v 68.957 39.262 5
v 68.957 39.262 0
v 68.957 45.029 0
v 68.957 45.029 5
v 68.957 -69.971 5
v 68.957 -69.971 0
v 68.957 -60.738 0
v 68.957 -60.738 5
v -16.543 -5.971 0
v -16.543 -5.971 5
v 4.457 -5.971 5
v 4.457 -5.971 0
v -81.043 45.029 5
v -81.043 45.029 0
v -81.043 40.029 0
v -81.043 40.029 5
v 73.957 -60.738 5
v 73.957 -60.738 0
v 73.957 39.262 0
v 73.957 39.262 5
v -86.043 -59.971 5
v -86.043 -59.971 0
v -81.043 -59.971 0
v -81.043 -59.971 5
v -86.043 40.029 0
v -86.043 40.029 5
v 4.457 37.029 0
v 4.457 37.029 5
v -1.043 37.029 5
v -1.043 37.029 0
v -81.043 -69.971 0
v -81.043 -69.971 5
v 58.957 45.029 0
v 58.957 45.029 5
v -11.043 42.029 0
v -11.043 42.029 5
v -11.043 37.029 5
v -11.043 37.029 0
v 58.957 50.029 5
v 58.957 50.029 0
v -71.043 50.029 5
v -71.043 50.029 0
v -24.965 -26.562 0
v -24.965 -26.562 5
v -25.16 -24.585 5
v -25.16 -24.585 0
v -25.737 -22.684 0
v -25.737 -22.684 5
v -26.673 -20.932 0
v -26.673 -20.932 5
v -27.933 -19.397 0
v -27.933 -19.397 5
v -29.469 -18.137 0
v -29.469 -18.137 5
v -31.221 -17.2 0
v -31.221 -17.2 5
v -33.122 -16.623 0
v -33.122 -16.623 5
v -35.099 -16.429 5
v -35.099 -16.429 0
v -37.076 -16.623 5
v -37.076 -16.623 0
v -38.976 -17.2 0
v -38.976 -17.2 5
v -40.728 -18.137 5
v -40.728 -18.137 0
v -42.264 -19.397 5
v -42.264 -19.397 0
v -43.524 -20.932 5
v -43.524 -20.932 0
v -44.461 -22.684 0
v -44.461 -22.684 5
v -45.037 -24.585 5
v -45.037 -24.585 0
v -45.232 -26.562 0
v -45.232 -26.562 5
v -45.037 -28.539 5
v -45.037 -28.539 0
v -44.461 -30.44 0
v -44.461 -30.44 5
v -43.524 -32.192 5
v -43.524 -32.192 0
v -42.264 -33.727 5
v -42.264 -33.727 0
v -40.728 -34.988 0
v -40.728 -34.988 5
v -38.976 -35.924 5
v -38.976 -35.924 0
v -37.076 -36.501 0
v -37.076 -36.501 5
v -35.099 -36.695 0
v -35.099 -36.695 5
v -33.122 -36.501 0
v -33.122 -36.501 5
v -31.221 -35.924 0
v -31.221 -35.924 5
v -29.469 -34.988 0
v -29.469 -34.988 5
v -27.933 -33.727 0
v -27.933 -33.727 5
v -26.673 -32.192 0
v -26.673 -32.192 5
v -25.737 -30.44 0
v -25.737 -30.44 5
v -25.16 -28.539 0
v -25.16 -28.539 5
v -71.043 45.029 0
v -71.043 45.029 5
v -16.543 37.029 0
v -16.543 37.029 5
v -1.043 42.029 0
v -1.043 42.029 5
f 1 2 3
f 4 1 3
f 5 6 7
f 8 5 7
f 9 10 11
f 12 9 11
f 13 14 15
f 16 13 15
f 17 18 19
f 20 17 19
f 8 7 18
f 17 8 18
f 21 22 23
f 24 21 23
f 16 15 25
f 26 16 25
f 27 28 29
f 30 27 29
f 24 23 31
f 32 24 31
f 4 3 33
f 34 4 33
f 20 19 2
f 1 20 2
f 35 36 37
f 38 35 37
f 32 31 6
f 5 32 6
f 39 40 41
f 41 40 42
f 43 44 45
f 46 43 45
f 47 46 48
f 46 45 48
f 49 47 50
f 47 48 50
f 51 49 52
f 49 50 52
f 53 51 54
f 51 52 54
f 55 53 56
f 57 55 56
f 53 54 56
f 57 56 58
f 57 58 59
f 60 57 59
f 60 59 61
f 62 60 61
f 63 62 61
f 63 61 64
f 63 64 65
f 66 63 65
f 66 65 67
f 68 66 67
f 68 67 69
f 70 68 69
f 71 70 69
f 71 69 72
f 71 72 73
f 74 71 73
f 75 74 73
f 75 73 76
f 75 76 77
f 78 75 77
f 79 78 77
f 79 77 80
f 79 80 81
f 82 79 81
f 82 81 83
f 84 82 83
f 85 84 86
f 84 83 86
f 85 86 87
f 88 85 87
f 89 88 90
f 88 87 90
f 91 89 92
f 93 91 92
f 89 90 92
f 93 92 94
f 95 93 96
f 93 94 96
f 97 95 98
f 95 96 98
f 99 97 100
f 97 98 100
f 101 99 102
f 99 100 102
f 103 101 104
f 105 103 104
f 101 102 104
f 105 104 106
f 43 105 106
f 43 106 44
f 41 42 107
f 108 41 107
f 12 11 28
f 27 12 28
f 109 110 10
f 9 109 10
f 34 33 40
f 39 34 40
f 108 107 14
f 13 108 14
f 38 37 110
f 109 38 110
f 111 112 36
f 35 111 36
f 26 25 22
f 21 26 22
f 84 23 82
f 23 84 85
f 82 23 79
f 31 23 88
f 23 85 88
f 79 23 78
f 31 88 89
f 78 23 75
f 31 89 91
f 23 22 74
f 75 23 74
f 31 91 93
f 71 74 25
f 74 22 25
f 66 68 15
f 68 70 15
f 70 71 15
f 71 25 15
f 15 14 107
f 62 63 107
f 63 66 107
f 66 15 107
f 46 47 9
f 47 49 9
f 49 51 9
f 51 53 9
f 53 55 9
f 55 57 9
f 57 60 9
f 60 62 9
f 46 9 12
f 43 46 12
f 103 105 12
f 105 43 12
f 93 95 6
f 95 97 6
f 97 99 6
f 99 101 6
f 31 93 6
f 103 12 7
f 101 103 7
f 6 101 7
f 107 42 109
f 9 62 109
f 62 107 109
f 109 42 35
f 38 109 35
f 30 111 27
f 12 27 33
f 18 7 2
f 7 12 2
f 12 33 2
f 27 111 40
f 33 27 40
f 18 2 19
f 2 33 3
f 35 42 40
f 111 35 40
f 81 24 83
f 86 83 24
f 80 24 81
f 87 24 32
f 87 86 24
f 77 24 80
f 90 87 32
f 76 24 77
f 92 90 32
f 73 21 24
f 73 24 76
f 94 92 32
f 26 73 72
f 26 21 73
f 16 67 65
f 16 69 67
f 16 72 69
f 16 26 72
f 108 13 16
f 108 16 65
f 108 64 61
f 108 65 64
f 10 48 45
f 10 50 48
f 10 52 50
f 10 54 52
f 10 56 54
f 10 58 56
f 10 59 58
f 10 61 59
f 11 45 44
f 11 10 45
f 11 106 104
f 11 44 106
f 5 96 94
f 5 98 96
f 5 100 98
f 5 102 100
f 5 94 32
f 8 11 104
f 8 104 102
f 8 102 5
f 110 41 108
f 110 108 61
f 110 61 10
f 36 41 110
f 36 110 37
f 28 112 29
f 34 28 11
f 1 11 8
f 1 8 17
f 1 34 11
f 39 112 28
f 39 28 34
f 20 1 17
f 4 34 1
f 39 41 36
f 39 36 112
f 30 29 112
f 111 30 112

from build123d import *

# Parameters (mm, degrees)
BOSS_EXTRU_2_DEPTH      = 5
ENL_V_MAT_EXTRU_1_DEPTH = 5
ESQUISSE4_R             = 10.133372482
ENL_V_MAT_EXTRU_2_DEPTH = 10


with BuildPart() as part:
    # Esquisse1 → Boss.-Extru.2 (new body)
    with BuildSketch(Plane.XY):
        Polygon((-81.043275043, -69.971346705), (68.956724957, -69.971346705), (68.956724957, -60.737835253), (73.956724957, -60.737835253), (73.956724957, 39.262164747), (68.956724957, 39.262164747), (68.956724957, 45.028653295), (58.956724957, 45.028653295), (58.956724957, 50.028653295), (-71.043275043, 50.028653295), (-71.043275043, 45.028653295), (-81.043275043, 45.028653295), (-81.043275043, 40.028653295), (-86.043275043, 40.028653295), (-86.043275043, -59.971346705), (-81.043275043, -59.971346705), align=None)
    extrude(amount=BOSS_EXTRU_2_DEPTH)

    # Esquisse3 → Enlèv. mat.-Extru.1 (cut)
    with BuildSketch(Plane.XY.offset(5)):
        Polygon((-16.543275043, 37.028653295), (-16.543275043, -5.971346705), (4.456724957, -5.971346705), (4.456724957, 37.028653295), (-1.043275043, 37.028653295), (-1.043275043, 42.028653295), (-6.043275043, 42.028653295), (-11.043275043, 42.028653295), (-11.043275043, 37.028653295), align=None)
    extrude(amount=-ENL_V_MAT_EXTRU_1_DEPTH, mode=Mode.SUBTRACT)

    # Esquisse4 → Enlèv. mat.-Extru.2 (cut)
    with BuildSketch(Plane.XY.offset(5)):
        with Locations((-35.098604503, -26.562111751)):
            Circle(ESQUISSE4_R)
    extrude(amount=-ENL_V_MAT_EXTRU_2_DEPTH, mode=Mode.SUBTRACT)


solid = part.part
